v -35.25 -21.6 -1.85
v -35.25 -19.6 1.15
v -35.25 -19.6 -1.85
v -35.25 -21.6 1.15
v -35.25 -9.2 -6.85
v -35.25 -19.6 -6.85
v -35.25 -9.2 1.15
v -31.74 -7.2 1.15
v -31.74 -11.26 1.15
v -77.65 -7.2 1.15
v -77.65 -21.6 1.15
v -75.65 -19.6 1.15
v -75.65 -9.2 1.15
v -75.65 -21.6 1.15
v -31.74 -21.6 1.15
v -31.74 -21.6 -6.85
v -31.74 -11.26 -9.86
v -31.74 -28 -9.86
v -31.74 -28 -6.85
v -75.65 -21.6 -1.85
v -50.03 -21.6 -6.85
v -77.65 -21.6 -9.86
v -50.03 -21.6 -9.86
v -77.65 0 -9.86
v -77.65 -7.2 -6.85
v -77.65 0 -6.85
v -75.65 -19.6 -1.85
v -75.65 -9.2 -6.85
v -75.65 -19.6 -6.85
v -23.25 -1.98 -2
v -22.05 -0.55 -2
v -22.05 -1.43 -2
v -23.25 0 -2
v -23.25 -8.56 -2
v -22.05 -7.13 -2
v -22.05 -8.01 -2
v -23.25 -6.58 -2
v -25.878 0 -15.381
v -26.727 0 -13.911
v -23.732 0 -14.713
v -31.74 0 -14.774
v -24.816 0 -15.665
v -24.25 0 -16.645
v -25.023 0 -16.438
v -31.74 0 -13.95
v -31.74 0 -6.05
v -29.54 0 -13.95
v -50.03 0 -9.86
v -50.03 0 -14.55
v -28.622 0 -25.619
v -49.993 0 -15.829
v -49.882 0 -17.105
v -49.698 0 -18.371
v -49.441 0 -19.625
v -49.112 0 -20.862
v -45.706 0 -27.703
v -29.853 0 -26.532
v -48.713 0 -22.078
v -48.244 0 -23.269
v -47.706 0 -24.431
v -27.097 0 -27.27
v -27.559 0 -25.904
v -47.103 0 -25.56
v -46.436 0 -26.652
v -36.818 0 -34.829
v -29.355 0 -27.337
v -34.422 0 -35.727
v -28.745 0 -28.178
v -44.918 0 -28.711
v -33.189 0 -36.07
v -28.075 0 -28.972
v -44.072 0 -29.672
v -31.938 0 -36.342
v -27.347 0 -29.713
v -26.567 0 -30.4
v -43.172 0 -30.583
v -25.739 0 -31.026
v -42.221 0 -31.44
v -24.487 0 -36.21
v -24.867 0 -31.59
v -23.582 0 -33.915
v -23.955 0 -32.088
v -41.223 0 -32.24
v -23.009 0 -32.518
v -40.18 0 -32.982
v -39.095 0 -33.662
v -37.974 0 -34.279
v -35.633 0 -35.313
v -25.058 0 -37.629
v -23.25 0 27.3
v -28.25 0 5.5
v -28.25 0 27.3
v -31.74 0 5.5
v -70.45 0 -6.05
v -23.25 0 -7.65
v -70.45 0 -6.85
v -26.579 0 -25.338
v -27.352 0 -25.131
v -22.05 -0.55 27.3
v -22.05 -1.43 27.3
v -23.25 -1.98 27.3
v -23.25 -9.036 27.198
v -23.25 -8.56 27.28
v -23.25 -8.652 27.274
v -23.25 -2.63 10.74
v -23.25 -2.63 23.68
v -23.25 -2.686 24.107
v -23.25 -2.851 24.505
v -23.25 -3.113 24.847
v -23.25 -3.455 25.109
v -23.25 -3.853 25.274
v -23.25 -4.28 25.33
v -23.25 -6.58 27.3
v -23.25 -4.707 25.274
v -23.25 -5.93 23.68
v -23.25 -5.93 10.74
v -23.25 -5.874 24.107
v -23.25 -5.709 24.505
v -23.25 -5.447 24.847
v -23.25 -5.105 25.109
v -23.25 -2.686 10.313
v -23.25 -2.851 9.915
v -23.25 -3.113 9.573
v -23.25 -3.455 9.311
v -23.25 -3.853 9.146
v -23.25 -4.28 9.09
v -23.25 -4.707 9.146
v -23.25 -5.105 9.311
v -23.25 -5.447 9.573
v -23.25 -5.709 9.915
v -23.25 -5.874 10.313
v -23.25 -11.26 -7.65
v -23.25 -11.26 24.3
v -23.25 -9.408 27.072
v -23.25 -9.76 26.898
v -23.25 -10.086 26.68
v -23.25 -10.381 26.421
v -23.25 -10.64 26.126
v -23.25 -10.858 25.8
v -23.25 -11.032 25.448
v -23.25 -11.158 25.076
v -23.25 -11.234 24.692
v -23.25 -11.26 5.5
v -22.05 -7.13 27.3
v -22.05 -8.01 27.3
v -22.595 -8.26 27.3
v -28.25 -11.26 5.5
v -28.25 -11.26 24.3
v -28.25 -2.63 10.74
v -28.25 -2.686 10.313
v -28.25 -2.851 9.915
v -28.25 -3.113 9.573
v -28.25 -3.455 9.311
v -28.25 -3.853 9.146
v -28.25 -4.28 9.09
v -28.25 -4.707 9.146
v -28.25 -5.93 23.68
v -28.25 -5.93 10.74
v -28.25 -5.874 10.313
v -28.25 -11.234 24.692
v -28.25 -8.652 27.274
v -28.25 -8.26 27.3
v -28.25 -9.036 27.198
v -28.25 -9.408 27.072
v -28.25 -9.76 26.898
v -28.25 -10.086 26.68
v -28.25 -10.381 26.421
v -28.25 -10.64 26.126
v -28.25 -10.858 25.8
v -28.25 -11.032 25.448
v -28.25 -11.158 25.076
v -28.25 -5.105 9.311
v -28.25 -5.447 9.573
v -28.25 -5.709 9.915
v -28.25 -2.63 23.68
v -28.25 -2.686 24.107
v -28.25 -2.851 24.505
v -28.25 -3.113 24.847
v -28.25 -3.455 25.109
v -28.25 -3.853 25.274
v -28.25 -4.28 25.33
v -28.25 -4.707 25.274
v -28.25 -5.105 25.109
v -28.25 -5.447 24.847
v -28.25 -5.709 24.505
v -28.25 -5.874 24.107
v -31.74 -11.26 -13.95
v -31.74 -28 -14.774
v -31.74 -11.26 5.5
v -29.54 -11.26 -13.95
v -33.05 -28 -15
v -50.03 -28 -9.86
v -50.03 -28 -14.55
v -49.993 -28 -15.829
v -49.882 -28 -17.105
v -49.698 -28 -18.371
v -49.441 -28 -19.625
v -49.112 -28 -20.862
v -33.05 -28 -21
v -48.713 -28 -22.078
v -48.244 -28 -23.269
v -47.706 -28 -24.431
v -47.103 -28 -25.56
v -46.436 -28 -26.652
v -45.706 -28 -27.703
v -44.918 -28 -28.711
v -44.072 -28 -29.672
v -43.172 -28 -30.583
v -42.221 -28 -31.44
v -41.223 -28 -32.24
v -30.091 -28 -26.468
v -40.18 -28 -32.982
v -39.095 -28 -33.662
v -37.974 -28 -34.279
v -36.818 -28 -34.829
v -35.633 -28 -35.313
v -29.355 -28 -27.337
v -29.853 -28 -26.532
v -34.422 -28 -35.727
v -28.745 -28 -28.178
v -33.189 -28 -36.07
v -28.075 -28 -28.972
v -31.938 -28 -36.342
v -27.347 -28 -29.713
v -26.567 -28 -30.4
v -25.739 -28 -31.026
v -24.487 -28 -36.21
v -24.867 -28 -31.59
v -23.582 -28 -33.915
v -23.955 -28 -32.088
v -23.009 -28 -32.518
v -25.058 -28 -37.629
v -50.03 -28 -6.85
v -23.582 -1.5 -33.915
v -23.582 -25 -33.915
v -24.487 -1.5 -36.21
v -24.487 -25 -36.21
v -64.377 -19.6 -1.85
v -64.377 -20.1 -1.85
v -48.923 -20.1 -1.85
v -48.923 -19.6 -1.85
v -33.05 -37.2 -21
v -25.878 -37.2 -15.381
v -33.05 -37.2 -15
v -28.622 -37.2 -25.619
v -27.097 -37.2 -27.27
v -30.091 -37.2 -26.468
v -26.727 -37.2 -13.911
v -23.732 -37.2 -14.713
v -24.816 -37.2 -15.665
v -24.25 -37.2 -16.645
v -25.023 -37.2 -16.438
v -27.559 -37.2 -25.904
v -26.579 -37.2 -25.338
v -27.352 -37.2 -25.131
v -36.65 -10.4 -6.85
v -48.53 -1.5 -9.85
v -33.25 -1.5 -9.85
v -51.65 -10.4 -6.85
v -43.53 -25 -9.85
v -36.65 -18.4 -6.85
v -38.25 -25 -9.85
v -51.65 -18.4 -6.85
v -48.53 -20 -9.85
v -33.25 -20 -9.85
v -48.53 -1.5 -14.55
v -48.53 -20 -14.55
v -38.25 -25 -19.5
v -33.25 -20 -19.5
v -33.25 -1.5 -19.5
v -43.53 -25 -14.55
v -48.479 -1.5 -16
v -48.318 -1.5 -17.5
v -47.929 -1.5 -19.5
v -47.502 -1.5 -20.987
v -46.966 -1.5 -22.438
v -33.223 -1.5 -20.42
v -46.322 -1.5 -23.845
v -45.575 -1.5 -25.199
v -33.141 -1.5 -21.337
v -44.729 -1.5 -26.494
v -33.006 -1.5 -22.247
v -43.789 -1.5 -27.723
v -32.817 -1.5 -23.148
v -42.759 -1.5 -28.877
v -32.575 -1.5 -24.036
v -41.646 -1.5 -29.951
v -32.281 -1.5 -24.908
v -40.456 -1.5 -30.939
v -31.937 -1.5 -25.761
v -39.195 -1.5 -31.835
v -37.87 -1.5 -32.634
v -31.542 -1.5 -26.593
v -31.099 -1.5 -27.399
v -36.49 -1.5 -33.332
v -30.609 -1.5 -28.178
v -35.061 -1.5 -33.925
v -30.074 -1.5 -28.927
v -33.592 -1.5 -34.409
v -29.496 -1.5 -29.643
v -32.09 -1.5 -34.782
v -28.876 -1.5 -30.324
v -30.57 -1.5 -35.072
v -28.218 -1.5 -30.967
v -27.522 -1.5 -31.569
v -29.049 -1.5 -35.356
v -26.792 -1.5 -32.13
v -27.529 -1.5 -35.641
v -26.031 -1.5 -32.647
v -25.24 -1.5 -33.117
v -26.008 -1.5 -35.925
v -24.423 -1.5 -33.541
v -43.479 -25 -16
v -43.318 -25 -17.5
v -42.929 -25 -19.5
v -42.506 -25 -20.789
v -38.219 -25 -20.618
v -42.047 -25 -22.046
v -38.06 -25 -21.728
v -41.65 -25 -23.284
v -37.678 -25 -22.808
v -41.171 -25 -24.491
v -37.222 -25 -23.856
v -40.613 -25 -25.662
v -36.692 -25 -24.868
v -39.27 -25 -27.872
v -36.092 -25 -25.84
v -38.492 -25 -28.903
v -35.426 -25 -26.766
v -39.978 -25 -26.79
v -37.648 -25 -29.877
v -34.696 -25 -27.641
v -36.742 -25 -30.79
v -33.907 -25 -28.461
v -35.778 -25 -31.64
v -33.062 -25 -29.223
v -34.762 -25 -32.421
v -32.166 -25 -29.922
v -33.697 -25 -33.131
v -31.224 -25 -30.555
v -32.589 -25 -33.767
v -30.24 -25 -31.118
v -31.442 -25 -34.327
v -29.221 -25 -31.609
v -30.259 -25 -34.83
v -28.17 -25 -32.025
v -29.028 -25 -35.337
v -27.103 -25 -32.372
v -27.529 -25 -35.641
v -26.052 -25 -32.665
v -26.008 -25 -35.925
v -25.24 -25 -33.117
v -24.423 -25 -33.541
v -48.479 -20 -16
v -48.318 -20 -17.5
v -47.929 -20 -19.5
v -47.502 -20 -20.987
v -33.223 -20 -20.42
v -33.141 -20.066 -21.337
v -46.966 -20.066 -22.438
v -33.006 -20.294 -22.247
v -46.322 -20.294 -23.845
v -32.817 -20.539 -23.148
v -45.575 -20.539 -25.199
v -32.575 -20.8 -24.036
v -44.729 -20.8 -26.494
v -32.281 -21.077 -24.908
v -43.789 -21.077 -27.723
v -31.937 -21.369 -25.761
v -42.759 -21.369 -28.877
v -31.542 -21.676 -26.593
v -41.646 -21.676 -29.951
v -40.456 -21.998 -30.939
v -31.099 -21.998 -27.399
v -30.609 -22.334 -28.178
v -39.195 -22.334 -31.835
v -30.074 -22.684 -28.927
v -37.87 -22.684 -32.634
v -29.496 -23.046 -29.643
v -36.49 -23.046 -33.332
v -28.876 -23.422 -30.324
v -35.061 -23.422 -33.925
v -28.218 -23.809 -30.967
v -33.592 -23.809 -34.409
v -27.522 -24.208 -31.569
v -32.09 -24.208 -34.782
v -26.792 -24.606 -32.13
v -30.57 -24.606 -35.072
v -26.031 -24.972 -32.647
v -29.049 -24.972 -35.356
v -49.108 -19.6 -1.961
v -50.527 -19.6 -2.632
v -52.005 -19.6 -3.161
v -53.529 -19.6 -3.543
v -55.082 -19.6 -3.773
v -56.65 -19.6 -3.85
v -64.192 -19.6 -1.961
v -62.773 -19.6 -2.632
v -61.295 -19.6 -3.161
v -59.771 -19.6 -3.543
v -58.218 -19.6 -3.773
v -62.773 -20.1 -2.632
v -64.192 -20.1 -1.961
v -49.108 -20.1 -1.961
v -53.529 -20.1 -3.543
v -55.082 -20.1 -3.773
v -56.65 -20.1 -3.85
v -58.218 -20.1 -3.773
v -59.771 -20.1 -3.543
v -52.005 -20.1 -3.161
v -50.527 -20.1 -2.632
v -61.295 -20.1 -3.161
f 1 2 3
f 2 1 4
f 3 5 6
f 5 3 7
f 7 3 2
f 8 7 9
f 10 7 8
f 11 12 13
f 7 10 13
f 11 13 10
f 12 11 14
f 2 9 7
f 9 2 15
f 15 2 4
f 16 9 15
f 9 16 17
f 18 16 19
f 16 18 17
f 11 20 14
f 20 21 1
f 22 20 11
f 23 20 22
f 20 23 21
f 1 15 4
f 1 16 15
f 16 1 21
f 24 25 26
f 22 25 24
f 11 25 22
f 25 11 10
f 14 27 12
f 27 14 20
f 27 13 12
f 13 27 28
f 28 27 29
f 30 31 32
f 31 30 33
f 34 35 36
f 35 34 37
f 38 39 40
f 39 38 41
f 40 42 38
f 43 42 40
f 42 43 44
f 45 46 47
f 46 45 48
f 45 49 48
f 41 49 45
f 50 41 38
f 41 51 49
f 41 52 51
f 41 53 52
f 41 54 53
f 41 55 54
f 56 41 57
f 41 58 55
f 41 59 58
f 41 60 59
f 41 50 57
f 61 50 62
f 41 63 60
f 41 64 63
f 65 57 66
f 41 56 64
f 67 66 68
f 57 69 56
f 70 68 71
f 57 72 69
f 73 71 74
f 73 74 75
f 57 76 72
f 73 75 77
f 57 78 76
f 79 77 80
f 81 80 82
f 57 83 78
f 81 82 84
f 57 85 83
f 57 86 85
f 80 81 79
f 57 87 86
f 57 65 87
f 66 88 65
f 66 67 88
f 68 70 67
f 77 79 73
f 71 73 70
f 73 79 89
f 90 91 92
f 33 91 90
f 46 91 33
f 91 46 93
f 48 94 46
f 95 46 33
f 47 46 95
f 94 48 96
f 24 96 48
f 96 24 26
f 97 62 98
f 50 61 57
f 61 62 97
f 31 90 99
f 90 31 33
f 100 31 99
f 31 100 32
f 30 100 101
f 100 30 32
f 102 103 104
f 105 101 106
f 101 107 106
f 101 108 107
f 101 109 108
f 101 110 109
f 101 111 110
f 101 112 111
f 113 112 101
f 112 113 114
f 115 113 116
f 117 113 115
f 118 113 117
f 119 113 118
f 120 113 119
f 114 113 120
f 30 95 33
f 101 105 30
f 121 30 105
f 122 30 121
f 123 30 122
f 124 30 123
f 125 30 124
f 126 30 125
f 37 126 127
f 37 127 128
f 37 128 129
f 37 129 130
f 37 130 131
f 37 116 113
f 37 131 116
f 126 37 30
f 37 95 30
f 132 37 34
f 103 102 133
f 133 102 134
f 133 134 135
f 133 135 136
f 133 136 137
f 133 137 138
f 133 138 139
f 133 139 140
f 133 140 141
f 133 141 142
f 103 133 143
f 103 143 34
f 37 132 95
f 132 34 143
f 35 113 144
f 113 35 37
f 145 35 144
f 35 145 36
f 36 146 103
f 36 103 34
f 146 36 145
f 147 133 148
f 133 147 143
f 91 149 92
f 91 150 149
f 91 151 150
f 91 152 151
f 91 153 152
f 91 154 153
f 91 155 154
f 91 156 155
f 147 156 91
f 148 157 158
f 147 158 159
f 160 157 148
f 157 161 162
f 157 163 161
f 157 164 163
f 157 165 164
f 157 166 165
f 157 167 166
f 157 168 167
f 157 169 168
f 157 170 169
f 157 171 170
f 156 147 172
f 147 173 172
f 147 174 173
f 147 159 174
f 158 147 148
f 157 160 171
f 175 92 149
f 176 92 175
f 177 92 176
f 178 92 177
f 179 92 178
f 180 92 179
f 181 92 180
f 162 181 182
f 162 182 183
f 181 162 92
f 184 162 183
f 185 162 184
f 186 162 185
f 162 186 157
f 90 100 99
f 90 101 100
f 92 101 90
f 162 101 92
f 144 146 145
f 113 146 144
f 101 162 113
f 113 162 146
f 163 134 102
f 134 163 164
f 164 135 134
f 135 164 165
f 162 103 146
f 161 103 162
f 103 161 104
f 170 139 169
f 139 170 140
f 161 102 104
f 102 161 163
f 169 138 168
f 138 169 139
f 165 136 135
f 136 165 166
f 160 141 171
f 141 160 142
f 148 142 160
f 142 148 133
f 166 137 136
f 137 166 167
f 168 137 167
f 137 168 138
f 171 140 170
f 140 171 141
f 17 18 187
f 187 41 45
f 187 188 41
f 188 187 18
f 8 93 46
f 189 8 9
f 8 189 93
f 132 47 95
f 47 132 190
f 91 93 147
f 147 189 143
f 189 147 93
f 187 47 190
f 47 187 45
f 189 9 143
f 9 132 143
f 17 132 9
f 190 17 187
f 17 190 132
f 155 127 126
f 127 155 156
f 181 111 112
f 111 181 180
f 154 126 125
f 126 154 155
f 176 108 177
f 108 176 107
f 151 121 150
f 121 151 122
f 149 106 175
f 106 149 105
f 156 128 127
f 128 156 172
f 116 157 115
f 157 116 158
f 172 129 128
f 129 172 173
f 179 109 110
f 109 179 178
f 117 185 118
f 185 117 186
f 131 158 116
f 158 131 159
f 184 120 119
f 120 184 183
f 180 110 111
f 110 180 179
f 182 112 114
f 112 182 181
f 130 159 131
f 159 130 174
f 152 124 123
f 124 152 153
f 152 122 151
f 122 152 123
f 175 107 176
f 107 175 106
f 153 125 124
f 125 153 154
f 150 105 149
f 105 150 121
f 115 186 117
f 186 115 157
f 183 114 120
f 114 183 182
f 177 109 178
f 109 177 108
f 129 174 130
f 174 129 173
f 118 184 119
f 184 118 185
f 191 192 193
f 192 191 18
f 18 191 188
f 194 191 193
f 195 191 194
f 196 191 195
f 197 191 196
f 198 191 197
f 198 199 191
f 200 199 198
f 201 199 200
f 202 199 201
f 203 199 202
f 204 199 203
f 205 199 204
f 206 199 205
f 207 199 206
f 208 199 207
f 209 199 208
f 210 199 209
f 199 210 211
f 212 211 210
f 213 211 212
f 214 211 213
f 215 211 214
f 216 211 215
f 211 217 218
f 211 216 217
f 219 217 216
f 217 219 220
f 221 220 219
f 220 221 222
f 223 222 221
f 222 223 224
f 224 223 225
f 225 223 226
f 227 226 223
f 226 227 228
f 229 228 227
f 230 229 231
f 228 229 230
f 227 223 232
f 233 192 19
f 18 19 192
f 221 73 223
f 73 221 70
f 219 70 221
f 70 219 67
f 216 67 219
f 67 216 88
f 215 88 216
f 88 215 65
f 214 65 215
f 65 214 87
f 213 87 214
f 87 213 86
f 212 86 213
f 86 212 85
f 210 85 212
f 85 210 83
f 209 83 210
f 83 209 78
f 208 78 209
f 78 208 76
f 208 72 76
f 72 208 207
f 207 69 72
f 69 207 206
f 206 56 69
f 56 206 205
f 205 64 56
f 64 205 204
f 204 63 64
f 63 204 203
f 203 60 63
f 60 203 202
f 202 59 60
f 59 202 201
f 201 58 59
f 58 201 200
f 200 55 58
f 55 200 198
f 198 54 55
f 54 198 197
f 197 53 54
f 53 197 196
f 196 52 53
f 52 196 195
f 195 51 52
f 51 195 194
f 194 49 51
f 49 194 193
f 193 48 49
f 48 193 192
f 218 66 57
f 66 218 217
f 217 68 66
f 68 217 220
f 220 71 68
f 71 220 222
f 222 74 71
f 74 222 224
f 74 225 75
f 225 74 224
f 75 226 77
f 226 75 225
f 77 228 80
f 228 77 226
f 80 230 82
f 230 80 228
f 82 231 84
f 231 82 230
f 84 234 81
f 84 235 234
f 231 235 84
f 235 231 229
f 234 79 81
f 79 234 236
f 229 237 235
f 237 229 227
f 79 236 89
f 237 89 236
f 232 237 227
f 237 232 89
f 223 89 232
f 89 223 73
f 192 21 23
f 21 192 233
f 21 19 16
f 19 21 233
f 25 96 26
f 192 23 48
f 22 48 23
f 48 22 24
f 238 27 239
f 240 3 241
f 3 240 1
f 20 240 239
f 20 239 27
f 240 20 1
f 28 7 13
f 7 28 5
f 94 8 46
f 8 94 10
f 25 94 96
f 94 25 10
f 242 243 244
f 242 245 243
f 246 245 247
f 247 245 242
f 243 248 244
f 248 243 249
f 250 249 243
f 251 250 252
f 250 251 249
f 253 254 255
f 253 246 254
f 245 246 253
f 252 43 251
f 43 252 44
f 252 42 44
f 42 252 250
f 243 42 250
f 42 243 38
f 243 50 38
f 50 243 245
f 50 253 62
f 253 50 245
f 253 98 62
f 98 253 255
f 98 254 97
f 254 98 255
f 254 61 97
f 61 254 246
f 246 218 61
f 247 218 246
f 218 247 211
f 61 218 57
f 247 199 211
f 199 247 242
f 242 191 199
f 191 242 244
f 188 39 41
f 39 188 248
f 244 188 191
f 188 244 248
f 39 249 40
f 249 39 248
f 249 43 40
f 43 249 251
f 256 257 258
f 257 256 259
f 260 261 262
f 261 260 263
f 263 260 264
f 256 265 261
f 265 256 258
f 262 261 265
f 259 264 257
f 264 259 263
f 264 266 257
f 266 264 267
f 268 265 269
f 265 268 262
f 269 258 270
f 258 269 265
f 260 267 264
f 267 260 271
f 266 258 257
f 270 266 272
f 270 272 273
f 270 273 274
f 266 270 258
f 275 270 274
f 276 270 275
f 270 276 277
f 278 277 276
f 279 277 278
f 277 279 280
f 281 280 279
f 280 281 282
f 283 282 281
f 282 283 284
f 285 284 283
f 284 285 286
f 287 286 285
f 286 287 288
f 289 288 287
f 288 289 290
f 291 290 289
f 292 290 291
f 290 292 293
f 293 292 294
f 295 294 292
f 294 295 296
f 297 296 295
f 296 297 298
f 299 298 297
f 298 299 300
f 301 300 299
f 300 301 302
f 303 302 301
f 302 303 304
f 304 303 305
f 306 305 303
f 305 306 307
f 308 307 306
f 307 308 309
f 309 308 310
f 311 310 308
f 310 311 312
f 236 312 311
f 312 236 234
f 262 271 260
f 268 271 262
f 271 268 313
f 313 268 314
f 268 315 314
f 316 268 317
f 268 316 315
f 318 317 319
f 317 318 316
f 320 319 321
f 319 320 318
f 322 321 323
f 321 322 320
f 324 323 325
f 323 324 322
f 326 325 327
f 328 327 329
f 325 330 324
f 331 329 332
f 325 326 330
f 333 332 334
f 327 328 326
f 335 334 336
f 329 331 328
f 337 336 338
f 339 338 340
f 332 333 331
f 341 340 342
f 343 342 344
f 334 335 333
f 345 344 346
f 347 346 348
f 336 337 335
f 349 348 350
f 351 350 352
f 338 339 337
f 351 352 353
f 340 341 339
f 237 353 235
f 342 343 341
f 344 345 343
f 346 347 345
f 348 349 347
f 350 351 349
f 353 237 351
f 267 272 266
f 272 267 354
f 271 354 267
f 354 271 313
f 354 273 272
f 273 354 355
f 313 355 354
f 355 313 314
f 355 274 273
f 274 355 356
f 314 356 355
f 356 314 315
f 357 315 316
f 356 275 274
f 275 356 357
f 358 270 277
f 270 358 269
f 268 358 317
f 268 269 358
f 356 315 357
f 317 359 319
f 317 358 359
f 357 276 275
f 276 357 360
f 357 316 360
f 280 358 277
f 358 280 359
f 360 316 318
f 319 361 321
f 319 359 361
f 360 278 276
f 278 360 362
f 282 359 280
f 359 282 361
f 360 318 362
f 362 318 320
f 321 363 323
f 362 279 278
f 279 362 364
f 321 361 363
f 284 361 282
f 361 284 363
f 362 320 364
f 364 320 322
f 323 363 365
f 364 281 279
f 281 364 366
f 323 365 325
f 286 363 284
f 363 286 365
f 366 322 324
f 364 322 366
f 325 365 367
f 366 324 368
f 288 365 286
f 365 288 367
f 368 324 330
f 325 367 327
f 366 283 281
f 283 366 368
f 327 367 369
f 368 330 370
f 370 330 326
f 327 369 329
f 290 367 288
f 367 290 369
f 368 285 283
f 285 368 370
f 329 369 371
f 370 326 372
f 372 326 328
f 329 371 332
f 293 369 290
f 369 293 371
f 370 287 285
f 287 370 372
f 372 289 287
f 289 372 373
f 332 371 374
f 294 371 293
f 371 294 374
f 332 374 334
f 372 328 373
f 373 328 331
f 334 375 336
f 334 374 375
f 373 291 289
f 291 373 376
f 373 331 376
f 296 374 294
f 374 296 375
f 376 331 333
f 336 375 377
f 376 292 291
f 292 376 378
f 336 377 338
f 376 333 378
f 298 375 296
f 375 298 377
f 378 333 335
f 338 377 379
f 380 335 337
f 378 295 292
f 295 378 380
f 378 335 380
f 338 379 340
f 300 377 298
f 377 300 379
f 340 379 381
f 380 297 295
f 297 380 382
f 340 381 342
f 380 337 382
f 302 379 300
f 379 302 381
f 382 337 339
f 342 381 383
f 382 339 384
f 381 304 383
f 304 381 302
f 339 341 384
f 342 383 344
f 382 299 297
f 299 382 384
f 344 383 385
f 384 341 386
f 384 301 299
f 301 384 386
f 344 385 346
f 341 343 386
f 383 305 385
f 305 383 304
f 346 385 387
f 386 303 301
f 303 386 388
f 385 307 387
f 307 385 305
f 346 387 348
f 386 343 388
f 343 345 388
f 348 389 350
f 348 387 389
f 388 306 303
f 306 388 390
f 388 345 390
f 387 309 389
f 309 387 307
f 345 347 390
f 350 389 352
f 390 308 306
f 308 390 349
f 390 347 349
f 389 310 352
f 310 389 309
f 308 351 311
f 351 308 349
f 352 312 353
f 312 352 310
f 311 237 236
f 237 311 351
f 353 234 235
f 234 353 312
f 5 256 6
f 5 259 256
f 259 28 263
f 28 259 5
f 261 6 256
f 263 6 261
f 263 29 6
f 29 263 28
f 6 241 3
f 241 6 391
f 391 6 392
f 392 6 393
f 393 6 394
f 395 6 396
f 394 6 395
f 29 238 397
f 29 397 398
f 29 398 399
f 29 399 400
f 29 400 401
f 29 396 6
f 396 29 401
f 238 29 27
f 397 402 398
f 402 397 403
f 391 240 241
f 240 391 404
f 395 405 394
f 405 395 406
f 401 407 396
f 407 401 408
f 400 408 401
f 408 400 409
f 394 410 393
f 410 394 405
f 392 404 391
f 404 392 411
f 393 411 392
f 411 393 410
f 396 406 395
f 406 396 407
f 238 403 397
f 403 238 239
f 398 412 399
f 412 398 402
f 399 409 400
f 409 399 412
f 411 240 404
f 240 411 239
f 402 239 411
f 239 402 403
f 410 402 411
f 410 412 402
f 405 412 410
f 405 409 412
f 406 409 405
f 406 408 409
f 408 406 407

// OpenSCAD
// file: lib/duct_body.scad
// Body of the one-piece 4010 ducts — Igneus V2 (Anet ET4/ET5)
// Remix of "IGNEUS V2 - E3D V6/VOLCANO" by Locos3D, CC BY-NC-SA 4.0
// https://www.thingiverse.com/thing:4178590
//
// Same frame as duct4010.scad: right-hand part as mounted, Z+ up, X- towards the nozzle, Y- = front.
// Drawn from scratch as a single part: the curves of the air channel, the rails of the mounting arm and its
// height slot are measured from Locos3D's 5015 duct, so it mounts and aims the air like the original.
// It prints lying on its flat back face (y = 0) without supports: every wall is a prism standing on that
// face or rises at 45 degrees, and what is left as a ceiling is a short bridge.

/* [Internal: one-piece duct body] */
// air channel in the XZ plane: inner wall (nozzle side) and outer wall, both arcs ending in the outlet
ch_near_c  = [-18.38, -19.50];   // centre of the inner wall curve
ch_near_r  = [14.07, 15.58];     // its outer face (towards the nozzle) and channel face
ch_near_a  = 67.7;               // the inner wall ends this many degrees below the horizontal
ch_far_c   = [-8.19, -14.55];    // centre of the outer wall curve
ch_far_r   = [20.67, 22.17];     // its channel face and outer face
ch_far_a   = 79.4;               // the curve ends here and a straight lip aims the air at the nozzle
ch_lip     = [7.3, 7.0];         // lip length: channel face, outer face
ch_back    = -1.5;               // channel back face: 1.5 mm wall on the face it prints on
ch_front   = -25.0;              // channel front face: 3 mm front wall
duct_d     = 28.0;               // depth of the duct (Y)
duct_top   = -9.85;              // top of the curved duct = where the air comes in
roof_c     = 5.0;                // 45° chamfers along the front edges of the channel...
roof_ridge = 4.0;                // ...leaving a flat strip this wide (a short bridge when printing)

// mounting arm: rails that slide into the body's grooves and the slot of the height-adjustment screw
arm_x      = [-12.8, -7.8];      // arm face against the body / outer face (the screw head bears on it)
arm_d      = 11.26;              // arm depth (Y)
arm_top    = 27.3;               // top of the arm
rail_tip   = -14.0;              // the rails stick out of the arm face up to here
rails      = [[0, 1.98], [6.58, 8.56]];   // rail bases (depth from the back face); tips 0.55 mm narrower each side
slot_y     = -4.28;              // height slot: centre (Y), width and the Z range of the screw
slot_w     = 3.3;
slot_z     = [9.09, 25.33];
spine_top  = 5.5;                // the block that joins arm and duct stays under the screw head

// derived: straight faces of the walls
near_out_x = ch_near_c[0] + ch_near_r[0];   // -4.31
near_in_x  = ch_near_c[0] + ch_near_r[1];   // -2.80
far_in_x   = ch_far_c[0] + ch_far_r[0];     // 12.48
far_out_x  = ch_far_c[0] + ch_far_r[1];     // 13.98

function pol(c, r, a) = [c[0] + r * cos(a), c[1] + r * sin(a)];
function lerp(a, b, t) = a + (b - a) * t;
function cw_dir(a) = [sin(a), -cos(a)];     // tangent of a circle at angle a, going clockwise
function seg_n(n) = [for (i = [0 : n]) i / n];

// outer wall, channel face: straight, then the arc, then the lip; f = 0..1 from the height of the inner
// wall's centre (where the inner wall starts to curve) to the tip of the lip
far_a0    = asin((ch_near_c[1] - ch_far_c[1]) / ch_far_r[0]);
far_arc_l = ch_far_r[0] * (ch_far_a + far_a0) * PI / 180;
function far_pt(f) = let(s = f * (far_arc_l + ch_lip[0]))
    s <= far_arc_l ? pol(ch_far_c, ch_far_r[0], far_a0 - s / ch_far_r[0] * 180 / PI)
                   : pol(ch_far_c, ch_far_r[0], -ch_far_a) + (s - far_arc_l) * cw_dir(-ch_far_a);
function near_pt(f) = pol(ch_near_c, ch_near_r[1], -f * ch_near_a);
function far_x_at(z) = z >= ch_far_c[1] ? far_in_x : ch_far_c[0] + sqrt(pow(ch_far_r[0], 2) - pow(z - ch_far_c[1], 2));

// Cross-section of the air path: the line from a (inner side) to b (outer side) in XZ, swept in Y from the
// back face yb to the front face yf, with the two front edges chamfered at 45 degrees by c.
function sec(a, b, yb = ch_back, yf = ch_front, c = roof_c) = [a, b, yb, yf, c];
function sec_pts(s) = let(a = s[0], b = s[1], yb = s[2], yf = s[3], l = norm(b - a), u = (b - a) / l,
                          c = min(s[4], max(0, (l - roof_ridge) / 2)))
    [[a[0], yb, a[1]], [b[0], yb, b[1]], [b[0], yf + c, b[1]],
     [b[0] - c * u[0], yf, b[1] - c * u[1]], [a[0] + c * u[0], yf, a[1] + c * u[1]], [a[0], yf + c, a[1]]];

// solid between consecutive cross-sections (each piece is convex, neighbours share a face)
module loft(secs) for (i = [0 : len(secs) - 2])
    hull() polyhedron(points = concat(sec_pts(secs[i]), sec_pts(secs[i + 1])),
                      faces = [[0, 1, 2, 3, 4, 5], [6, 7, 8, 9, 10, 11]]);

// The curved duct, from its top (duct_top) to 1.5 mm past the outlet
function duct_secs(n = 20) = concat(
    [for (z = [duct_top, -12, ch_far_c[1], -16, -17.5, ch_near_c[1]]) sec([near_in_x, z], [far_x_at(z), z])],
    [for (f = seg_n(n)) if (f > 0) sec(near_pt(f), far_pt(f))],
    [sec(near_pt(1) + 1.5 * cw_dir(-ch_near_a), far_pt(1) + 1.5 * cw_dir(-ch_far_a))]);

module duct_channel() loft(duct_secs());

// XZ outline of the duct walls, from z_top down to the outlet
module duct_outline(z_top = duct_top) {
    a_near = -ch_near_a;
    lip_out_end = pol(ch_far_c, ch_far_r[1], -ch_far_a) + ch_lip[1] * cw_dir(-ch_far_a);
    polygon(concat(
        [[near_out_x, z_top]],
        [for (f = seg_n(16)) pol(ch_near_c, ch_near_r[0], -f * ch_near_a)],   // inner wall, nozzle side
        [pol(ch_near_c, ch_near_r[1], a_near)],                              // its end, across the wall
        [far_pt(1)],                                                         // across the outlet
        [lip_out_end],                                                       // end of the lip
        [for (f = seg_n(24)) pol(ch_far_c, ch_far_r[1], -ch_far_a * (1 - f))],   // outer wall, back up
        [[far_out_x, z_top]]));
}

// the duct walls as a prism standing on the back face
module duct_shell(z_top = duct_top) rotate([90, 0, 0]) linear_extrude(height = duct_d) duct_outline(z_top);

// Arm profile in XY (rails on the face against the body)
module arm_profile() {
    teeth = [for (r = rails) each [[arm_x[0], -r[0]], [rail_tip, -r[0] - 0.55], [rail_tip, -r[1] + 0.55], [arm_x[0], -r[1]]]];
    polygon(concat([[arm_x[1], 0], [arm_x[1], -arm_d], [arm_x[0], -arm_d]], [for (i = [len(teeth) - 1 : -1 : 0]) teeth[i]]));
}

// Mounting arm: the rails slide into the grooves on the side of the Igneus body and the M3 screw goes through
// the height slot into the body. The spine joins it to the duct, below the screw head.
module mount_arm() {
    difference() {
        union() {
            intersection() {
                translate([0, 0, -2]) linear_extrude(height = arm_top + 2) arm_profile();
                // round the top front corner (the back corner stays square: it sits on the bed)
                rotate([90, 0, 90]) translate([0, 0, -20]) linear_extrude(height = 20)
                    offset(r = 3) offset(delta = -3) translate([-arm_d, -10]) square([arm_d + 3, arm_top + 10]);
            }
            // spine: from the arm to the inner wall of the duct, chamfered under the arm
            rotate([90, 0, 0]) linear_extrude(height = arm_d)
                polygon([[arm_x[0], spine_top], [near_out_x, spine_top], [near_out_x, duct_top - 4.1],
                         [near_out_x - 2.2, duct_top - 4.1], [arm_x[0], duct_top + 2.2]]);
        }
        slot();
    }
}

module slot()
    hull() for (z = [slot_z[0] + slot_w / 2, slot_z[1] - slot_w / 2])
        translate([arm_x[0] - 2.5, slot_y, z]) rotate([0, 90, 0]) cylinder(d = slot_w, h = arm_x[1] - arm_x[0] + 5, $fn = 24);
// file: lib/flat4010.scad
// Flat variant of the 4010 adapter — Igneus V2 (Anet ET4/ET5)
// Remix of "IGNEUS V2 - E3D V6/VOLCANO" by Locos3D, CC BY-NC-SA 4.0
// https://www.thingiverse.com/thing:4178590
//
// The 4010 blower sits on top of the adapter with its intake facing the front (like the 2510 hotend fan),
// as low as possible: the fan pocket sits right on top of the nozzle that goes into the original 5015 duct.
// Same coordinate system as duct4010.scad (right-hand part, as mounted; Y- = front).
include <duct4010.scad>

/* [Flat variant] */
flat_floor    = 3.0;            // floor between the nozzle and the fan (mm)
flat_cradle_h = 8.0;            // cradle depth (mm): in this variant the fan is held by the cradle alone
flat_front_h  = 5.0;            // one-piece duct: front wall of the cradle, below the blower's intake (mm)
flat_outlet   = [1.2, 16.2];    // fan outlet along its bottom edge, measured from the inner end (mm)
flat_fan_x0   = -0.6;           // inner side of the fan (just clear of the duct arm, whose face is at x = -2.8)
flat_fan_y0   = -19.4;          // front face of the fan (intake), centred over the nozzle
flat_z_seat   = nozzle_top + flat_floor;   // where the bottom edge of the fan rests

flat_cradle_x = [-2.8, flat_fan_x0 + fan_w + clearance + cradle_wall];
flat_cradle_y = [flat_fan_y0 - clearance - cradle_wall, flat_fan_y0 + fan_t + clearance + cradle_wall];
function flat_out_x() = [flat_fan_x0 + flat_outlet[0], flat_fan_x0 + flat_outlet[1]];
function flat_out_y() = [flat_fan_y0 + 1.0, flat_fan_y0 + fan_t - 1.0];

// Floor over the top of the nozzle (stopping at y = -5.1, in front of the two ribs on the inside of the duct's
// back plate), and the cradle block on it, 0.15 mm above the top edges of the duct walls. Where the floor is
// wider than the cradle it narrows at 45° (or steeper) up to it, and a wedge in the socket's notch covers the
// top of the key tab: printed upside down, nothing sticks out into the air.
module flat_body() {
    w = x_ext[1] - x_ext[0];
    hull() {
        translate([x_ext[0], -24.9, nozzle_top]) cube([w, 19.8, eps]);
        translate([x_ext[0], flat_cradle_y[0], nozzle_top + 3.3]) cube([w, flat_cradle_y[1] - flat_cradle_y[0], eps]);
    }
    kx = [socket_key[0][0] + 0.15, socket_key[0][1] - 0.15];
    ky = socket_key[1] - 0.19;                   // back face of the key tab
    translate([kx[0], 0, 0]) rotate([90, 0, 90]) linear_extrude(height = kx[1] - kx[0])
        polygon([[-7.3, nozzle_top], [ky, nozzle_top], [ky, nozzle_top + 0.2], [-7.3, nozzle_top + 0.2 + ky + 7.3]]);
    translate([flat_cradle_x[0], flat_cradle_y[0], nozzle_top + 0.15])
        cube([flat_cradle_x[1] - flat_cradle_x[0], flat_cradle_y[1] - flat_cradle_y[0], flat_floor - 0.15 + flat_cradle_h]);
}

// Air path: through the nozzle, then a short taper into the fan outlet
module flat_air() {
    in_w = nozzle_in[1] - nozzle_in[0];
    translate([nozzle_in[0][0], nozzle_in[0][1], -16]) cube([in_w[0], in_w[1], 16 + nozzle_top + eps]);
    hull() {
        translate([nozzle_in[0][0], nozzle_in[0][1], nozzle_top]) cube([in_w[0], in_w[1], eps]);
        translate([flat_out_x()[0], flat_out_y()[0], flat_z_seat])
            cube([flat_out_x()[1] - flat_out_x()[0], flat_out_y()[1] - flat_out_y()[0], eps]);
    }
}

module flat_pocket() {
    translate([flat_fan_x0 - clearance, flat_fan_y0 - clearance, flat_z_seat])
        cube([fan_w + 2 * clearance, fan_t + 2 * clearance, flat_cradle_h + 40]);
    // relief for the ring round the intake (see fan_pocket); impeller axis 21.2 mm from the inner end, 19 mm up
    translate([flat_fan_x0 + 21.2, flat_fan_y0 - clearance + eps, flat_z_seat + 19])
        rotate([90, 0, 0]) cylinder(d = intake_rim, h = 0.5 + eps, $fn = 64);
}

// Flat 4010 adapter for the original 5015 duct (separate part). Prints upside down without supports.
module adapter4010_flat()
    difference() {
        union() { nozzle(); flat_body(); }
        flat_air();
        flat_pocket();
    }

// One-piece duct, flat version: duct, floor, cradle and mounting arm drawn as one part, with the LED channel.
// Prints lying on its flat back face without supports; the low front wall of the cradle is a bridge between
// the two end walls.
module duct4010_flat() {
    cx = [near_out_x, flat_cradle_x[1]];   cy = flat_cradle_y;   // the inner end wall reaches the duct's wall
    zt = flat_z_seat + flat_cradle_h;
    px0 = flat_fan_x0 - clearance;
    back = cy[1] - cradle_wall;          // back wall of the cradle, behind the fan
    ox = flat_out_x();   oy = flat_out_y();
    plenum = [sec([ox[0], flat_z_seat + 0.5], [ox[1], flat_z_seat + 0.5], oy[1], oy[0], 0),
              sec([ox[0], flat_z_seat], [ox[1], flat_z_seat], oy[1], oy[0], 0)];
    difference() {
        union() {
            duct_shell(duct_top);
            // floor: over the duct and under the whole cradle
            translate([near_out_x, -duct_d, duct_top - eps]) cube([far_out_x - near_out_x, duct_d, flat_floor + eps]);
            translate([cx[0], cy[0], duct_top - eps]) cube([cx[1] - cx[0], -cy[0], flat_floor + eps]);
            // cradle walls: low front wall, full-height end walls and back wall
            translate([cx[0], cy[0], flat_z_seat - eps]) cube([cx[1] - cx[0], cy[1] - cy[0], min(flat_front_h, flat_cradle_h) + eps]);
            for (w = [[cx[0], px0], [cx[1] - cradle_wall, cx[1]]])
                translate([w[0], cy[0], flat_z_seat - eps]) cube([w[1] - w[0], cy[1] - cy[0], zt - flat_z_seat + eps]);
            translate([cx[0], back, flat_z_seat - eps]) cube([cx[1] - cx[0], cy[1] - back, zt - flat_z_seat + eps]);
            // behind the cradle, down to the back face at 45°
            hull() {
                translate([cx[0], cy[1] - eps, duct_top]) cube([cx[1] - cx[0], eps, zt - duct_top]);
                translate([cx[0], -eps, duct_top]) cube([cx[1] - cx[0] + cy[1], eps, zt - duct_top + cy[1]]);
            }
            mount_arm();
            if (led) led_channel();
        }
        loft(concat(plenum, duct_secs()));
        flat_pocket();
        slot();
    }
}

echo(str("Flat cradle: ", fan_w + 2 * clearance, " x ", fan_t + 2 * clearance, " mm, fan edge at z = ", flat_z_seat));
// main file
// color: #1d1d1f
// variant: onepiece_flat
// One-piece 4010 duct, flat version (blower on top, intake to the front), left side (as mounted).
include <lib/flat4010.scad>

translate([-36.05, 0, 0]) mirror([1, 0, 0]) duct4010_flat();
